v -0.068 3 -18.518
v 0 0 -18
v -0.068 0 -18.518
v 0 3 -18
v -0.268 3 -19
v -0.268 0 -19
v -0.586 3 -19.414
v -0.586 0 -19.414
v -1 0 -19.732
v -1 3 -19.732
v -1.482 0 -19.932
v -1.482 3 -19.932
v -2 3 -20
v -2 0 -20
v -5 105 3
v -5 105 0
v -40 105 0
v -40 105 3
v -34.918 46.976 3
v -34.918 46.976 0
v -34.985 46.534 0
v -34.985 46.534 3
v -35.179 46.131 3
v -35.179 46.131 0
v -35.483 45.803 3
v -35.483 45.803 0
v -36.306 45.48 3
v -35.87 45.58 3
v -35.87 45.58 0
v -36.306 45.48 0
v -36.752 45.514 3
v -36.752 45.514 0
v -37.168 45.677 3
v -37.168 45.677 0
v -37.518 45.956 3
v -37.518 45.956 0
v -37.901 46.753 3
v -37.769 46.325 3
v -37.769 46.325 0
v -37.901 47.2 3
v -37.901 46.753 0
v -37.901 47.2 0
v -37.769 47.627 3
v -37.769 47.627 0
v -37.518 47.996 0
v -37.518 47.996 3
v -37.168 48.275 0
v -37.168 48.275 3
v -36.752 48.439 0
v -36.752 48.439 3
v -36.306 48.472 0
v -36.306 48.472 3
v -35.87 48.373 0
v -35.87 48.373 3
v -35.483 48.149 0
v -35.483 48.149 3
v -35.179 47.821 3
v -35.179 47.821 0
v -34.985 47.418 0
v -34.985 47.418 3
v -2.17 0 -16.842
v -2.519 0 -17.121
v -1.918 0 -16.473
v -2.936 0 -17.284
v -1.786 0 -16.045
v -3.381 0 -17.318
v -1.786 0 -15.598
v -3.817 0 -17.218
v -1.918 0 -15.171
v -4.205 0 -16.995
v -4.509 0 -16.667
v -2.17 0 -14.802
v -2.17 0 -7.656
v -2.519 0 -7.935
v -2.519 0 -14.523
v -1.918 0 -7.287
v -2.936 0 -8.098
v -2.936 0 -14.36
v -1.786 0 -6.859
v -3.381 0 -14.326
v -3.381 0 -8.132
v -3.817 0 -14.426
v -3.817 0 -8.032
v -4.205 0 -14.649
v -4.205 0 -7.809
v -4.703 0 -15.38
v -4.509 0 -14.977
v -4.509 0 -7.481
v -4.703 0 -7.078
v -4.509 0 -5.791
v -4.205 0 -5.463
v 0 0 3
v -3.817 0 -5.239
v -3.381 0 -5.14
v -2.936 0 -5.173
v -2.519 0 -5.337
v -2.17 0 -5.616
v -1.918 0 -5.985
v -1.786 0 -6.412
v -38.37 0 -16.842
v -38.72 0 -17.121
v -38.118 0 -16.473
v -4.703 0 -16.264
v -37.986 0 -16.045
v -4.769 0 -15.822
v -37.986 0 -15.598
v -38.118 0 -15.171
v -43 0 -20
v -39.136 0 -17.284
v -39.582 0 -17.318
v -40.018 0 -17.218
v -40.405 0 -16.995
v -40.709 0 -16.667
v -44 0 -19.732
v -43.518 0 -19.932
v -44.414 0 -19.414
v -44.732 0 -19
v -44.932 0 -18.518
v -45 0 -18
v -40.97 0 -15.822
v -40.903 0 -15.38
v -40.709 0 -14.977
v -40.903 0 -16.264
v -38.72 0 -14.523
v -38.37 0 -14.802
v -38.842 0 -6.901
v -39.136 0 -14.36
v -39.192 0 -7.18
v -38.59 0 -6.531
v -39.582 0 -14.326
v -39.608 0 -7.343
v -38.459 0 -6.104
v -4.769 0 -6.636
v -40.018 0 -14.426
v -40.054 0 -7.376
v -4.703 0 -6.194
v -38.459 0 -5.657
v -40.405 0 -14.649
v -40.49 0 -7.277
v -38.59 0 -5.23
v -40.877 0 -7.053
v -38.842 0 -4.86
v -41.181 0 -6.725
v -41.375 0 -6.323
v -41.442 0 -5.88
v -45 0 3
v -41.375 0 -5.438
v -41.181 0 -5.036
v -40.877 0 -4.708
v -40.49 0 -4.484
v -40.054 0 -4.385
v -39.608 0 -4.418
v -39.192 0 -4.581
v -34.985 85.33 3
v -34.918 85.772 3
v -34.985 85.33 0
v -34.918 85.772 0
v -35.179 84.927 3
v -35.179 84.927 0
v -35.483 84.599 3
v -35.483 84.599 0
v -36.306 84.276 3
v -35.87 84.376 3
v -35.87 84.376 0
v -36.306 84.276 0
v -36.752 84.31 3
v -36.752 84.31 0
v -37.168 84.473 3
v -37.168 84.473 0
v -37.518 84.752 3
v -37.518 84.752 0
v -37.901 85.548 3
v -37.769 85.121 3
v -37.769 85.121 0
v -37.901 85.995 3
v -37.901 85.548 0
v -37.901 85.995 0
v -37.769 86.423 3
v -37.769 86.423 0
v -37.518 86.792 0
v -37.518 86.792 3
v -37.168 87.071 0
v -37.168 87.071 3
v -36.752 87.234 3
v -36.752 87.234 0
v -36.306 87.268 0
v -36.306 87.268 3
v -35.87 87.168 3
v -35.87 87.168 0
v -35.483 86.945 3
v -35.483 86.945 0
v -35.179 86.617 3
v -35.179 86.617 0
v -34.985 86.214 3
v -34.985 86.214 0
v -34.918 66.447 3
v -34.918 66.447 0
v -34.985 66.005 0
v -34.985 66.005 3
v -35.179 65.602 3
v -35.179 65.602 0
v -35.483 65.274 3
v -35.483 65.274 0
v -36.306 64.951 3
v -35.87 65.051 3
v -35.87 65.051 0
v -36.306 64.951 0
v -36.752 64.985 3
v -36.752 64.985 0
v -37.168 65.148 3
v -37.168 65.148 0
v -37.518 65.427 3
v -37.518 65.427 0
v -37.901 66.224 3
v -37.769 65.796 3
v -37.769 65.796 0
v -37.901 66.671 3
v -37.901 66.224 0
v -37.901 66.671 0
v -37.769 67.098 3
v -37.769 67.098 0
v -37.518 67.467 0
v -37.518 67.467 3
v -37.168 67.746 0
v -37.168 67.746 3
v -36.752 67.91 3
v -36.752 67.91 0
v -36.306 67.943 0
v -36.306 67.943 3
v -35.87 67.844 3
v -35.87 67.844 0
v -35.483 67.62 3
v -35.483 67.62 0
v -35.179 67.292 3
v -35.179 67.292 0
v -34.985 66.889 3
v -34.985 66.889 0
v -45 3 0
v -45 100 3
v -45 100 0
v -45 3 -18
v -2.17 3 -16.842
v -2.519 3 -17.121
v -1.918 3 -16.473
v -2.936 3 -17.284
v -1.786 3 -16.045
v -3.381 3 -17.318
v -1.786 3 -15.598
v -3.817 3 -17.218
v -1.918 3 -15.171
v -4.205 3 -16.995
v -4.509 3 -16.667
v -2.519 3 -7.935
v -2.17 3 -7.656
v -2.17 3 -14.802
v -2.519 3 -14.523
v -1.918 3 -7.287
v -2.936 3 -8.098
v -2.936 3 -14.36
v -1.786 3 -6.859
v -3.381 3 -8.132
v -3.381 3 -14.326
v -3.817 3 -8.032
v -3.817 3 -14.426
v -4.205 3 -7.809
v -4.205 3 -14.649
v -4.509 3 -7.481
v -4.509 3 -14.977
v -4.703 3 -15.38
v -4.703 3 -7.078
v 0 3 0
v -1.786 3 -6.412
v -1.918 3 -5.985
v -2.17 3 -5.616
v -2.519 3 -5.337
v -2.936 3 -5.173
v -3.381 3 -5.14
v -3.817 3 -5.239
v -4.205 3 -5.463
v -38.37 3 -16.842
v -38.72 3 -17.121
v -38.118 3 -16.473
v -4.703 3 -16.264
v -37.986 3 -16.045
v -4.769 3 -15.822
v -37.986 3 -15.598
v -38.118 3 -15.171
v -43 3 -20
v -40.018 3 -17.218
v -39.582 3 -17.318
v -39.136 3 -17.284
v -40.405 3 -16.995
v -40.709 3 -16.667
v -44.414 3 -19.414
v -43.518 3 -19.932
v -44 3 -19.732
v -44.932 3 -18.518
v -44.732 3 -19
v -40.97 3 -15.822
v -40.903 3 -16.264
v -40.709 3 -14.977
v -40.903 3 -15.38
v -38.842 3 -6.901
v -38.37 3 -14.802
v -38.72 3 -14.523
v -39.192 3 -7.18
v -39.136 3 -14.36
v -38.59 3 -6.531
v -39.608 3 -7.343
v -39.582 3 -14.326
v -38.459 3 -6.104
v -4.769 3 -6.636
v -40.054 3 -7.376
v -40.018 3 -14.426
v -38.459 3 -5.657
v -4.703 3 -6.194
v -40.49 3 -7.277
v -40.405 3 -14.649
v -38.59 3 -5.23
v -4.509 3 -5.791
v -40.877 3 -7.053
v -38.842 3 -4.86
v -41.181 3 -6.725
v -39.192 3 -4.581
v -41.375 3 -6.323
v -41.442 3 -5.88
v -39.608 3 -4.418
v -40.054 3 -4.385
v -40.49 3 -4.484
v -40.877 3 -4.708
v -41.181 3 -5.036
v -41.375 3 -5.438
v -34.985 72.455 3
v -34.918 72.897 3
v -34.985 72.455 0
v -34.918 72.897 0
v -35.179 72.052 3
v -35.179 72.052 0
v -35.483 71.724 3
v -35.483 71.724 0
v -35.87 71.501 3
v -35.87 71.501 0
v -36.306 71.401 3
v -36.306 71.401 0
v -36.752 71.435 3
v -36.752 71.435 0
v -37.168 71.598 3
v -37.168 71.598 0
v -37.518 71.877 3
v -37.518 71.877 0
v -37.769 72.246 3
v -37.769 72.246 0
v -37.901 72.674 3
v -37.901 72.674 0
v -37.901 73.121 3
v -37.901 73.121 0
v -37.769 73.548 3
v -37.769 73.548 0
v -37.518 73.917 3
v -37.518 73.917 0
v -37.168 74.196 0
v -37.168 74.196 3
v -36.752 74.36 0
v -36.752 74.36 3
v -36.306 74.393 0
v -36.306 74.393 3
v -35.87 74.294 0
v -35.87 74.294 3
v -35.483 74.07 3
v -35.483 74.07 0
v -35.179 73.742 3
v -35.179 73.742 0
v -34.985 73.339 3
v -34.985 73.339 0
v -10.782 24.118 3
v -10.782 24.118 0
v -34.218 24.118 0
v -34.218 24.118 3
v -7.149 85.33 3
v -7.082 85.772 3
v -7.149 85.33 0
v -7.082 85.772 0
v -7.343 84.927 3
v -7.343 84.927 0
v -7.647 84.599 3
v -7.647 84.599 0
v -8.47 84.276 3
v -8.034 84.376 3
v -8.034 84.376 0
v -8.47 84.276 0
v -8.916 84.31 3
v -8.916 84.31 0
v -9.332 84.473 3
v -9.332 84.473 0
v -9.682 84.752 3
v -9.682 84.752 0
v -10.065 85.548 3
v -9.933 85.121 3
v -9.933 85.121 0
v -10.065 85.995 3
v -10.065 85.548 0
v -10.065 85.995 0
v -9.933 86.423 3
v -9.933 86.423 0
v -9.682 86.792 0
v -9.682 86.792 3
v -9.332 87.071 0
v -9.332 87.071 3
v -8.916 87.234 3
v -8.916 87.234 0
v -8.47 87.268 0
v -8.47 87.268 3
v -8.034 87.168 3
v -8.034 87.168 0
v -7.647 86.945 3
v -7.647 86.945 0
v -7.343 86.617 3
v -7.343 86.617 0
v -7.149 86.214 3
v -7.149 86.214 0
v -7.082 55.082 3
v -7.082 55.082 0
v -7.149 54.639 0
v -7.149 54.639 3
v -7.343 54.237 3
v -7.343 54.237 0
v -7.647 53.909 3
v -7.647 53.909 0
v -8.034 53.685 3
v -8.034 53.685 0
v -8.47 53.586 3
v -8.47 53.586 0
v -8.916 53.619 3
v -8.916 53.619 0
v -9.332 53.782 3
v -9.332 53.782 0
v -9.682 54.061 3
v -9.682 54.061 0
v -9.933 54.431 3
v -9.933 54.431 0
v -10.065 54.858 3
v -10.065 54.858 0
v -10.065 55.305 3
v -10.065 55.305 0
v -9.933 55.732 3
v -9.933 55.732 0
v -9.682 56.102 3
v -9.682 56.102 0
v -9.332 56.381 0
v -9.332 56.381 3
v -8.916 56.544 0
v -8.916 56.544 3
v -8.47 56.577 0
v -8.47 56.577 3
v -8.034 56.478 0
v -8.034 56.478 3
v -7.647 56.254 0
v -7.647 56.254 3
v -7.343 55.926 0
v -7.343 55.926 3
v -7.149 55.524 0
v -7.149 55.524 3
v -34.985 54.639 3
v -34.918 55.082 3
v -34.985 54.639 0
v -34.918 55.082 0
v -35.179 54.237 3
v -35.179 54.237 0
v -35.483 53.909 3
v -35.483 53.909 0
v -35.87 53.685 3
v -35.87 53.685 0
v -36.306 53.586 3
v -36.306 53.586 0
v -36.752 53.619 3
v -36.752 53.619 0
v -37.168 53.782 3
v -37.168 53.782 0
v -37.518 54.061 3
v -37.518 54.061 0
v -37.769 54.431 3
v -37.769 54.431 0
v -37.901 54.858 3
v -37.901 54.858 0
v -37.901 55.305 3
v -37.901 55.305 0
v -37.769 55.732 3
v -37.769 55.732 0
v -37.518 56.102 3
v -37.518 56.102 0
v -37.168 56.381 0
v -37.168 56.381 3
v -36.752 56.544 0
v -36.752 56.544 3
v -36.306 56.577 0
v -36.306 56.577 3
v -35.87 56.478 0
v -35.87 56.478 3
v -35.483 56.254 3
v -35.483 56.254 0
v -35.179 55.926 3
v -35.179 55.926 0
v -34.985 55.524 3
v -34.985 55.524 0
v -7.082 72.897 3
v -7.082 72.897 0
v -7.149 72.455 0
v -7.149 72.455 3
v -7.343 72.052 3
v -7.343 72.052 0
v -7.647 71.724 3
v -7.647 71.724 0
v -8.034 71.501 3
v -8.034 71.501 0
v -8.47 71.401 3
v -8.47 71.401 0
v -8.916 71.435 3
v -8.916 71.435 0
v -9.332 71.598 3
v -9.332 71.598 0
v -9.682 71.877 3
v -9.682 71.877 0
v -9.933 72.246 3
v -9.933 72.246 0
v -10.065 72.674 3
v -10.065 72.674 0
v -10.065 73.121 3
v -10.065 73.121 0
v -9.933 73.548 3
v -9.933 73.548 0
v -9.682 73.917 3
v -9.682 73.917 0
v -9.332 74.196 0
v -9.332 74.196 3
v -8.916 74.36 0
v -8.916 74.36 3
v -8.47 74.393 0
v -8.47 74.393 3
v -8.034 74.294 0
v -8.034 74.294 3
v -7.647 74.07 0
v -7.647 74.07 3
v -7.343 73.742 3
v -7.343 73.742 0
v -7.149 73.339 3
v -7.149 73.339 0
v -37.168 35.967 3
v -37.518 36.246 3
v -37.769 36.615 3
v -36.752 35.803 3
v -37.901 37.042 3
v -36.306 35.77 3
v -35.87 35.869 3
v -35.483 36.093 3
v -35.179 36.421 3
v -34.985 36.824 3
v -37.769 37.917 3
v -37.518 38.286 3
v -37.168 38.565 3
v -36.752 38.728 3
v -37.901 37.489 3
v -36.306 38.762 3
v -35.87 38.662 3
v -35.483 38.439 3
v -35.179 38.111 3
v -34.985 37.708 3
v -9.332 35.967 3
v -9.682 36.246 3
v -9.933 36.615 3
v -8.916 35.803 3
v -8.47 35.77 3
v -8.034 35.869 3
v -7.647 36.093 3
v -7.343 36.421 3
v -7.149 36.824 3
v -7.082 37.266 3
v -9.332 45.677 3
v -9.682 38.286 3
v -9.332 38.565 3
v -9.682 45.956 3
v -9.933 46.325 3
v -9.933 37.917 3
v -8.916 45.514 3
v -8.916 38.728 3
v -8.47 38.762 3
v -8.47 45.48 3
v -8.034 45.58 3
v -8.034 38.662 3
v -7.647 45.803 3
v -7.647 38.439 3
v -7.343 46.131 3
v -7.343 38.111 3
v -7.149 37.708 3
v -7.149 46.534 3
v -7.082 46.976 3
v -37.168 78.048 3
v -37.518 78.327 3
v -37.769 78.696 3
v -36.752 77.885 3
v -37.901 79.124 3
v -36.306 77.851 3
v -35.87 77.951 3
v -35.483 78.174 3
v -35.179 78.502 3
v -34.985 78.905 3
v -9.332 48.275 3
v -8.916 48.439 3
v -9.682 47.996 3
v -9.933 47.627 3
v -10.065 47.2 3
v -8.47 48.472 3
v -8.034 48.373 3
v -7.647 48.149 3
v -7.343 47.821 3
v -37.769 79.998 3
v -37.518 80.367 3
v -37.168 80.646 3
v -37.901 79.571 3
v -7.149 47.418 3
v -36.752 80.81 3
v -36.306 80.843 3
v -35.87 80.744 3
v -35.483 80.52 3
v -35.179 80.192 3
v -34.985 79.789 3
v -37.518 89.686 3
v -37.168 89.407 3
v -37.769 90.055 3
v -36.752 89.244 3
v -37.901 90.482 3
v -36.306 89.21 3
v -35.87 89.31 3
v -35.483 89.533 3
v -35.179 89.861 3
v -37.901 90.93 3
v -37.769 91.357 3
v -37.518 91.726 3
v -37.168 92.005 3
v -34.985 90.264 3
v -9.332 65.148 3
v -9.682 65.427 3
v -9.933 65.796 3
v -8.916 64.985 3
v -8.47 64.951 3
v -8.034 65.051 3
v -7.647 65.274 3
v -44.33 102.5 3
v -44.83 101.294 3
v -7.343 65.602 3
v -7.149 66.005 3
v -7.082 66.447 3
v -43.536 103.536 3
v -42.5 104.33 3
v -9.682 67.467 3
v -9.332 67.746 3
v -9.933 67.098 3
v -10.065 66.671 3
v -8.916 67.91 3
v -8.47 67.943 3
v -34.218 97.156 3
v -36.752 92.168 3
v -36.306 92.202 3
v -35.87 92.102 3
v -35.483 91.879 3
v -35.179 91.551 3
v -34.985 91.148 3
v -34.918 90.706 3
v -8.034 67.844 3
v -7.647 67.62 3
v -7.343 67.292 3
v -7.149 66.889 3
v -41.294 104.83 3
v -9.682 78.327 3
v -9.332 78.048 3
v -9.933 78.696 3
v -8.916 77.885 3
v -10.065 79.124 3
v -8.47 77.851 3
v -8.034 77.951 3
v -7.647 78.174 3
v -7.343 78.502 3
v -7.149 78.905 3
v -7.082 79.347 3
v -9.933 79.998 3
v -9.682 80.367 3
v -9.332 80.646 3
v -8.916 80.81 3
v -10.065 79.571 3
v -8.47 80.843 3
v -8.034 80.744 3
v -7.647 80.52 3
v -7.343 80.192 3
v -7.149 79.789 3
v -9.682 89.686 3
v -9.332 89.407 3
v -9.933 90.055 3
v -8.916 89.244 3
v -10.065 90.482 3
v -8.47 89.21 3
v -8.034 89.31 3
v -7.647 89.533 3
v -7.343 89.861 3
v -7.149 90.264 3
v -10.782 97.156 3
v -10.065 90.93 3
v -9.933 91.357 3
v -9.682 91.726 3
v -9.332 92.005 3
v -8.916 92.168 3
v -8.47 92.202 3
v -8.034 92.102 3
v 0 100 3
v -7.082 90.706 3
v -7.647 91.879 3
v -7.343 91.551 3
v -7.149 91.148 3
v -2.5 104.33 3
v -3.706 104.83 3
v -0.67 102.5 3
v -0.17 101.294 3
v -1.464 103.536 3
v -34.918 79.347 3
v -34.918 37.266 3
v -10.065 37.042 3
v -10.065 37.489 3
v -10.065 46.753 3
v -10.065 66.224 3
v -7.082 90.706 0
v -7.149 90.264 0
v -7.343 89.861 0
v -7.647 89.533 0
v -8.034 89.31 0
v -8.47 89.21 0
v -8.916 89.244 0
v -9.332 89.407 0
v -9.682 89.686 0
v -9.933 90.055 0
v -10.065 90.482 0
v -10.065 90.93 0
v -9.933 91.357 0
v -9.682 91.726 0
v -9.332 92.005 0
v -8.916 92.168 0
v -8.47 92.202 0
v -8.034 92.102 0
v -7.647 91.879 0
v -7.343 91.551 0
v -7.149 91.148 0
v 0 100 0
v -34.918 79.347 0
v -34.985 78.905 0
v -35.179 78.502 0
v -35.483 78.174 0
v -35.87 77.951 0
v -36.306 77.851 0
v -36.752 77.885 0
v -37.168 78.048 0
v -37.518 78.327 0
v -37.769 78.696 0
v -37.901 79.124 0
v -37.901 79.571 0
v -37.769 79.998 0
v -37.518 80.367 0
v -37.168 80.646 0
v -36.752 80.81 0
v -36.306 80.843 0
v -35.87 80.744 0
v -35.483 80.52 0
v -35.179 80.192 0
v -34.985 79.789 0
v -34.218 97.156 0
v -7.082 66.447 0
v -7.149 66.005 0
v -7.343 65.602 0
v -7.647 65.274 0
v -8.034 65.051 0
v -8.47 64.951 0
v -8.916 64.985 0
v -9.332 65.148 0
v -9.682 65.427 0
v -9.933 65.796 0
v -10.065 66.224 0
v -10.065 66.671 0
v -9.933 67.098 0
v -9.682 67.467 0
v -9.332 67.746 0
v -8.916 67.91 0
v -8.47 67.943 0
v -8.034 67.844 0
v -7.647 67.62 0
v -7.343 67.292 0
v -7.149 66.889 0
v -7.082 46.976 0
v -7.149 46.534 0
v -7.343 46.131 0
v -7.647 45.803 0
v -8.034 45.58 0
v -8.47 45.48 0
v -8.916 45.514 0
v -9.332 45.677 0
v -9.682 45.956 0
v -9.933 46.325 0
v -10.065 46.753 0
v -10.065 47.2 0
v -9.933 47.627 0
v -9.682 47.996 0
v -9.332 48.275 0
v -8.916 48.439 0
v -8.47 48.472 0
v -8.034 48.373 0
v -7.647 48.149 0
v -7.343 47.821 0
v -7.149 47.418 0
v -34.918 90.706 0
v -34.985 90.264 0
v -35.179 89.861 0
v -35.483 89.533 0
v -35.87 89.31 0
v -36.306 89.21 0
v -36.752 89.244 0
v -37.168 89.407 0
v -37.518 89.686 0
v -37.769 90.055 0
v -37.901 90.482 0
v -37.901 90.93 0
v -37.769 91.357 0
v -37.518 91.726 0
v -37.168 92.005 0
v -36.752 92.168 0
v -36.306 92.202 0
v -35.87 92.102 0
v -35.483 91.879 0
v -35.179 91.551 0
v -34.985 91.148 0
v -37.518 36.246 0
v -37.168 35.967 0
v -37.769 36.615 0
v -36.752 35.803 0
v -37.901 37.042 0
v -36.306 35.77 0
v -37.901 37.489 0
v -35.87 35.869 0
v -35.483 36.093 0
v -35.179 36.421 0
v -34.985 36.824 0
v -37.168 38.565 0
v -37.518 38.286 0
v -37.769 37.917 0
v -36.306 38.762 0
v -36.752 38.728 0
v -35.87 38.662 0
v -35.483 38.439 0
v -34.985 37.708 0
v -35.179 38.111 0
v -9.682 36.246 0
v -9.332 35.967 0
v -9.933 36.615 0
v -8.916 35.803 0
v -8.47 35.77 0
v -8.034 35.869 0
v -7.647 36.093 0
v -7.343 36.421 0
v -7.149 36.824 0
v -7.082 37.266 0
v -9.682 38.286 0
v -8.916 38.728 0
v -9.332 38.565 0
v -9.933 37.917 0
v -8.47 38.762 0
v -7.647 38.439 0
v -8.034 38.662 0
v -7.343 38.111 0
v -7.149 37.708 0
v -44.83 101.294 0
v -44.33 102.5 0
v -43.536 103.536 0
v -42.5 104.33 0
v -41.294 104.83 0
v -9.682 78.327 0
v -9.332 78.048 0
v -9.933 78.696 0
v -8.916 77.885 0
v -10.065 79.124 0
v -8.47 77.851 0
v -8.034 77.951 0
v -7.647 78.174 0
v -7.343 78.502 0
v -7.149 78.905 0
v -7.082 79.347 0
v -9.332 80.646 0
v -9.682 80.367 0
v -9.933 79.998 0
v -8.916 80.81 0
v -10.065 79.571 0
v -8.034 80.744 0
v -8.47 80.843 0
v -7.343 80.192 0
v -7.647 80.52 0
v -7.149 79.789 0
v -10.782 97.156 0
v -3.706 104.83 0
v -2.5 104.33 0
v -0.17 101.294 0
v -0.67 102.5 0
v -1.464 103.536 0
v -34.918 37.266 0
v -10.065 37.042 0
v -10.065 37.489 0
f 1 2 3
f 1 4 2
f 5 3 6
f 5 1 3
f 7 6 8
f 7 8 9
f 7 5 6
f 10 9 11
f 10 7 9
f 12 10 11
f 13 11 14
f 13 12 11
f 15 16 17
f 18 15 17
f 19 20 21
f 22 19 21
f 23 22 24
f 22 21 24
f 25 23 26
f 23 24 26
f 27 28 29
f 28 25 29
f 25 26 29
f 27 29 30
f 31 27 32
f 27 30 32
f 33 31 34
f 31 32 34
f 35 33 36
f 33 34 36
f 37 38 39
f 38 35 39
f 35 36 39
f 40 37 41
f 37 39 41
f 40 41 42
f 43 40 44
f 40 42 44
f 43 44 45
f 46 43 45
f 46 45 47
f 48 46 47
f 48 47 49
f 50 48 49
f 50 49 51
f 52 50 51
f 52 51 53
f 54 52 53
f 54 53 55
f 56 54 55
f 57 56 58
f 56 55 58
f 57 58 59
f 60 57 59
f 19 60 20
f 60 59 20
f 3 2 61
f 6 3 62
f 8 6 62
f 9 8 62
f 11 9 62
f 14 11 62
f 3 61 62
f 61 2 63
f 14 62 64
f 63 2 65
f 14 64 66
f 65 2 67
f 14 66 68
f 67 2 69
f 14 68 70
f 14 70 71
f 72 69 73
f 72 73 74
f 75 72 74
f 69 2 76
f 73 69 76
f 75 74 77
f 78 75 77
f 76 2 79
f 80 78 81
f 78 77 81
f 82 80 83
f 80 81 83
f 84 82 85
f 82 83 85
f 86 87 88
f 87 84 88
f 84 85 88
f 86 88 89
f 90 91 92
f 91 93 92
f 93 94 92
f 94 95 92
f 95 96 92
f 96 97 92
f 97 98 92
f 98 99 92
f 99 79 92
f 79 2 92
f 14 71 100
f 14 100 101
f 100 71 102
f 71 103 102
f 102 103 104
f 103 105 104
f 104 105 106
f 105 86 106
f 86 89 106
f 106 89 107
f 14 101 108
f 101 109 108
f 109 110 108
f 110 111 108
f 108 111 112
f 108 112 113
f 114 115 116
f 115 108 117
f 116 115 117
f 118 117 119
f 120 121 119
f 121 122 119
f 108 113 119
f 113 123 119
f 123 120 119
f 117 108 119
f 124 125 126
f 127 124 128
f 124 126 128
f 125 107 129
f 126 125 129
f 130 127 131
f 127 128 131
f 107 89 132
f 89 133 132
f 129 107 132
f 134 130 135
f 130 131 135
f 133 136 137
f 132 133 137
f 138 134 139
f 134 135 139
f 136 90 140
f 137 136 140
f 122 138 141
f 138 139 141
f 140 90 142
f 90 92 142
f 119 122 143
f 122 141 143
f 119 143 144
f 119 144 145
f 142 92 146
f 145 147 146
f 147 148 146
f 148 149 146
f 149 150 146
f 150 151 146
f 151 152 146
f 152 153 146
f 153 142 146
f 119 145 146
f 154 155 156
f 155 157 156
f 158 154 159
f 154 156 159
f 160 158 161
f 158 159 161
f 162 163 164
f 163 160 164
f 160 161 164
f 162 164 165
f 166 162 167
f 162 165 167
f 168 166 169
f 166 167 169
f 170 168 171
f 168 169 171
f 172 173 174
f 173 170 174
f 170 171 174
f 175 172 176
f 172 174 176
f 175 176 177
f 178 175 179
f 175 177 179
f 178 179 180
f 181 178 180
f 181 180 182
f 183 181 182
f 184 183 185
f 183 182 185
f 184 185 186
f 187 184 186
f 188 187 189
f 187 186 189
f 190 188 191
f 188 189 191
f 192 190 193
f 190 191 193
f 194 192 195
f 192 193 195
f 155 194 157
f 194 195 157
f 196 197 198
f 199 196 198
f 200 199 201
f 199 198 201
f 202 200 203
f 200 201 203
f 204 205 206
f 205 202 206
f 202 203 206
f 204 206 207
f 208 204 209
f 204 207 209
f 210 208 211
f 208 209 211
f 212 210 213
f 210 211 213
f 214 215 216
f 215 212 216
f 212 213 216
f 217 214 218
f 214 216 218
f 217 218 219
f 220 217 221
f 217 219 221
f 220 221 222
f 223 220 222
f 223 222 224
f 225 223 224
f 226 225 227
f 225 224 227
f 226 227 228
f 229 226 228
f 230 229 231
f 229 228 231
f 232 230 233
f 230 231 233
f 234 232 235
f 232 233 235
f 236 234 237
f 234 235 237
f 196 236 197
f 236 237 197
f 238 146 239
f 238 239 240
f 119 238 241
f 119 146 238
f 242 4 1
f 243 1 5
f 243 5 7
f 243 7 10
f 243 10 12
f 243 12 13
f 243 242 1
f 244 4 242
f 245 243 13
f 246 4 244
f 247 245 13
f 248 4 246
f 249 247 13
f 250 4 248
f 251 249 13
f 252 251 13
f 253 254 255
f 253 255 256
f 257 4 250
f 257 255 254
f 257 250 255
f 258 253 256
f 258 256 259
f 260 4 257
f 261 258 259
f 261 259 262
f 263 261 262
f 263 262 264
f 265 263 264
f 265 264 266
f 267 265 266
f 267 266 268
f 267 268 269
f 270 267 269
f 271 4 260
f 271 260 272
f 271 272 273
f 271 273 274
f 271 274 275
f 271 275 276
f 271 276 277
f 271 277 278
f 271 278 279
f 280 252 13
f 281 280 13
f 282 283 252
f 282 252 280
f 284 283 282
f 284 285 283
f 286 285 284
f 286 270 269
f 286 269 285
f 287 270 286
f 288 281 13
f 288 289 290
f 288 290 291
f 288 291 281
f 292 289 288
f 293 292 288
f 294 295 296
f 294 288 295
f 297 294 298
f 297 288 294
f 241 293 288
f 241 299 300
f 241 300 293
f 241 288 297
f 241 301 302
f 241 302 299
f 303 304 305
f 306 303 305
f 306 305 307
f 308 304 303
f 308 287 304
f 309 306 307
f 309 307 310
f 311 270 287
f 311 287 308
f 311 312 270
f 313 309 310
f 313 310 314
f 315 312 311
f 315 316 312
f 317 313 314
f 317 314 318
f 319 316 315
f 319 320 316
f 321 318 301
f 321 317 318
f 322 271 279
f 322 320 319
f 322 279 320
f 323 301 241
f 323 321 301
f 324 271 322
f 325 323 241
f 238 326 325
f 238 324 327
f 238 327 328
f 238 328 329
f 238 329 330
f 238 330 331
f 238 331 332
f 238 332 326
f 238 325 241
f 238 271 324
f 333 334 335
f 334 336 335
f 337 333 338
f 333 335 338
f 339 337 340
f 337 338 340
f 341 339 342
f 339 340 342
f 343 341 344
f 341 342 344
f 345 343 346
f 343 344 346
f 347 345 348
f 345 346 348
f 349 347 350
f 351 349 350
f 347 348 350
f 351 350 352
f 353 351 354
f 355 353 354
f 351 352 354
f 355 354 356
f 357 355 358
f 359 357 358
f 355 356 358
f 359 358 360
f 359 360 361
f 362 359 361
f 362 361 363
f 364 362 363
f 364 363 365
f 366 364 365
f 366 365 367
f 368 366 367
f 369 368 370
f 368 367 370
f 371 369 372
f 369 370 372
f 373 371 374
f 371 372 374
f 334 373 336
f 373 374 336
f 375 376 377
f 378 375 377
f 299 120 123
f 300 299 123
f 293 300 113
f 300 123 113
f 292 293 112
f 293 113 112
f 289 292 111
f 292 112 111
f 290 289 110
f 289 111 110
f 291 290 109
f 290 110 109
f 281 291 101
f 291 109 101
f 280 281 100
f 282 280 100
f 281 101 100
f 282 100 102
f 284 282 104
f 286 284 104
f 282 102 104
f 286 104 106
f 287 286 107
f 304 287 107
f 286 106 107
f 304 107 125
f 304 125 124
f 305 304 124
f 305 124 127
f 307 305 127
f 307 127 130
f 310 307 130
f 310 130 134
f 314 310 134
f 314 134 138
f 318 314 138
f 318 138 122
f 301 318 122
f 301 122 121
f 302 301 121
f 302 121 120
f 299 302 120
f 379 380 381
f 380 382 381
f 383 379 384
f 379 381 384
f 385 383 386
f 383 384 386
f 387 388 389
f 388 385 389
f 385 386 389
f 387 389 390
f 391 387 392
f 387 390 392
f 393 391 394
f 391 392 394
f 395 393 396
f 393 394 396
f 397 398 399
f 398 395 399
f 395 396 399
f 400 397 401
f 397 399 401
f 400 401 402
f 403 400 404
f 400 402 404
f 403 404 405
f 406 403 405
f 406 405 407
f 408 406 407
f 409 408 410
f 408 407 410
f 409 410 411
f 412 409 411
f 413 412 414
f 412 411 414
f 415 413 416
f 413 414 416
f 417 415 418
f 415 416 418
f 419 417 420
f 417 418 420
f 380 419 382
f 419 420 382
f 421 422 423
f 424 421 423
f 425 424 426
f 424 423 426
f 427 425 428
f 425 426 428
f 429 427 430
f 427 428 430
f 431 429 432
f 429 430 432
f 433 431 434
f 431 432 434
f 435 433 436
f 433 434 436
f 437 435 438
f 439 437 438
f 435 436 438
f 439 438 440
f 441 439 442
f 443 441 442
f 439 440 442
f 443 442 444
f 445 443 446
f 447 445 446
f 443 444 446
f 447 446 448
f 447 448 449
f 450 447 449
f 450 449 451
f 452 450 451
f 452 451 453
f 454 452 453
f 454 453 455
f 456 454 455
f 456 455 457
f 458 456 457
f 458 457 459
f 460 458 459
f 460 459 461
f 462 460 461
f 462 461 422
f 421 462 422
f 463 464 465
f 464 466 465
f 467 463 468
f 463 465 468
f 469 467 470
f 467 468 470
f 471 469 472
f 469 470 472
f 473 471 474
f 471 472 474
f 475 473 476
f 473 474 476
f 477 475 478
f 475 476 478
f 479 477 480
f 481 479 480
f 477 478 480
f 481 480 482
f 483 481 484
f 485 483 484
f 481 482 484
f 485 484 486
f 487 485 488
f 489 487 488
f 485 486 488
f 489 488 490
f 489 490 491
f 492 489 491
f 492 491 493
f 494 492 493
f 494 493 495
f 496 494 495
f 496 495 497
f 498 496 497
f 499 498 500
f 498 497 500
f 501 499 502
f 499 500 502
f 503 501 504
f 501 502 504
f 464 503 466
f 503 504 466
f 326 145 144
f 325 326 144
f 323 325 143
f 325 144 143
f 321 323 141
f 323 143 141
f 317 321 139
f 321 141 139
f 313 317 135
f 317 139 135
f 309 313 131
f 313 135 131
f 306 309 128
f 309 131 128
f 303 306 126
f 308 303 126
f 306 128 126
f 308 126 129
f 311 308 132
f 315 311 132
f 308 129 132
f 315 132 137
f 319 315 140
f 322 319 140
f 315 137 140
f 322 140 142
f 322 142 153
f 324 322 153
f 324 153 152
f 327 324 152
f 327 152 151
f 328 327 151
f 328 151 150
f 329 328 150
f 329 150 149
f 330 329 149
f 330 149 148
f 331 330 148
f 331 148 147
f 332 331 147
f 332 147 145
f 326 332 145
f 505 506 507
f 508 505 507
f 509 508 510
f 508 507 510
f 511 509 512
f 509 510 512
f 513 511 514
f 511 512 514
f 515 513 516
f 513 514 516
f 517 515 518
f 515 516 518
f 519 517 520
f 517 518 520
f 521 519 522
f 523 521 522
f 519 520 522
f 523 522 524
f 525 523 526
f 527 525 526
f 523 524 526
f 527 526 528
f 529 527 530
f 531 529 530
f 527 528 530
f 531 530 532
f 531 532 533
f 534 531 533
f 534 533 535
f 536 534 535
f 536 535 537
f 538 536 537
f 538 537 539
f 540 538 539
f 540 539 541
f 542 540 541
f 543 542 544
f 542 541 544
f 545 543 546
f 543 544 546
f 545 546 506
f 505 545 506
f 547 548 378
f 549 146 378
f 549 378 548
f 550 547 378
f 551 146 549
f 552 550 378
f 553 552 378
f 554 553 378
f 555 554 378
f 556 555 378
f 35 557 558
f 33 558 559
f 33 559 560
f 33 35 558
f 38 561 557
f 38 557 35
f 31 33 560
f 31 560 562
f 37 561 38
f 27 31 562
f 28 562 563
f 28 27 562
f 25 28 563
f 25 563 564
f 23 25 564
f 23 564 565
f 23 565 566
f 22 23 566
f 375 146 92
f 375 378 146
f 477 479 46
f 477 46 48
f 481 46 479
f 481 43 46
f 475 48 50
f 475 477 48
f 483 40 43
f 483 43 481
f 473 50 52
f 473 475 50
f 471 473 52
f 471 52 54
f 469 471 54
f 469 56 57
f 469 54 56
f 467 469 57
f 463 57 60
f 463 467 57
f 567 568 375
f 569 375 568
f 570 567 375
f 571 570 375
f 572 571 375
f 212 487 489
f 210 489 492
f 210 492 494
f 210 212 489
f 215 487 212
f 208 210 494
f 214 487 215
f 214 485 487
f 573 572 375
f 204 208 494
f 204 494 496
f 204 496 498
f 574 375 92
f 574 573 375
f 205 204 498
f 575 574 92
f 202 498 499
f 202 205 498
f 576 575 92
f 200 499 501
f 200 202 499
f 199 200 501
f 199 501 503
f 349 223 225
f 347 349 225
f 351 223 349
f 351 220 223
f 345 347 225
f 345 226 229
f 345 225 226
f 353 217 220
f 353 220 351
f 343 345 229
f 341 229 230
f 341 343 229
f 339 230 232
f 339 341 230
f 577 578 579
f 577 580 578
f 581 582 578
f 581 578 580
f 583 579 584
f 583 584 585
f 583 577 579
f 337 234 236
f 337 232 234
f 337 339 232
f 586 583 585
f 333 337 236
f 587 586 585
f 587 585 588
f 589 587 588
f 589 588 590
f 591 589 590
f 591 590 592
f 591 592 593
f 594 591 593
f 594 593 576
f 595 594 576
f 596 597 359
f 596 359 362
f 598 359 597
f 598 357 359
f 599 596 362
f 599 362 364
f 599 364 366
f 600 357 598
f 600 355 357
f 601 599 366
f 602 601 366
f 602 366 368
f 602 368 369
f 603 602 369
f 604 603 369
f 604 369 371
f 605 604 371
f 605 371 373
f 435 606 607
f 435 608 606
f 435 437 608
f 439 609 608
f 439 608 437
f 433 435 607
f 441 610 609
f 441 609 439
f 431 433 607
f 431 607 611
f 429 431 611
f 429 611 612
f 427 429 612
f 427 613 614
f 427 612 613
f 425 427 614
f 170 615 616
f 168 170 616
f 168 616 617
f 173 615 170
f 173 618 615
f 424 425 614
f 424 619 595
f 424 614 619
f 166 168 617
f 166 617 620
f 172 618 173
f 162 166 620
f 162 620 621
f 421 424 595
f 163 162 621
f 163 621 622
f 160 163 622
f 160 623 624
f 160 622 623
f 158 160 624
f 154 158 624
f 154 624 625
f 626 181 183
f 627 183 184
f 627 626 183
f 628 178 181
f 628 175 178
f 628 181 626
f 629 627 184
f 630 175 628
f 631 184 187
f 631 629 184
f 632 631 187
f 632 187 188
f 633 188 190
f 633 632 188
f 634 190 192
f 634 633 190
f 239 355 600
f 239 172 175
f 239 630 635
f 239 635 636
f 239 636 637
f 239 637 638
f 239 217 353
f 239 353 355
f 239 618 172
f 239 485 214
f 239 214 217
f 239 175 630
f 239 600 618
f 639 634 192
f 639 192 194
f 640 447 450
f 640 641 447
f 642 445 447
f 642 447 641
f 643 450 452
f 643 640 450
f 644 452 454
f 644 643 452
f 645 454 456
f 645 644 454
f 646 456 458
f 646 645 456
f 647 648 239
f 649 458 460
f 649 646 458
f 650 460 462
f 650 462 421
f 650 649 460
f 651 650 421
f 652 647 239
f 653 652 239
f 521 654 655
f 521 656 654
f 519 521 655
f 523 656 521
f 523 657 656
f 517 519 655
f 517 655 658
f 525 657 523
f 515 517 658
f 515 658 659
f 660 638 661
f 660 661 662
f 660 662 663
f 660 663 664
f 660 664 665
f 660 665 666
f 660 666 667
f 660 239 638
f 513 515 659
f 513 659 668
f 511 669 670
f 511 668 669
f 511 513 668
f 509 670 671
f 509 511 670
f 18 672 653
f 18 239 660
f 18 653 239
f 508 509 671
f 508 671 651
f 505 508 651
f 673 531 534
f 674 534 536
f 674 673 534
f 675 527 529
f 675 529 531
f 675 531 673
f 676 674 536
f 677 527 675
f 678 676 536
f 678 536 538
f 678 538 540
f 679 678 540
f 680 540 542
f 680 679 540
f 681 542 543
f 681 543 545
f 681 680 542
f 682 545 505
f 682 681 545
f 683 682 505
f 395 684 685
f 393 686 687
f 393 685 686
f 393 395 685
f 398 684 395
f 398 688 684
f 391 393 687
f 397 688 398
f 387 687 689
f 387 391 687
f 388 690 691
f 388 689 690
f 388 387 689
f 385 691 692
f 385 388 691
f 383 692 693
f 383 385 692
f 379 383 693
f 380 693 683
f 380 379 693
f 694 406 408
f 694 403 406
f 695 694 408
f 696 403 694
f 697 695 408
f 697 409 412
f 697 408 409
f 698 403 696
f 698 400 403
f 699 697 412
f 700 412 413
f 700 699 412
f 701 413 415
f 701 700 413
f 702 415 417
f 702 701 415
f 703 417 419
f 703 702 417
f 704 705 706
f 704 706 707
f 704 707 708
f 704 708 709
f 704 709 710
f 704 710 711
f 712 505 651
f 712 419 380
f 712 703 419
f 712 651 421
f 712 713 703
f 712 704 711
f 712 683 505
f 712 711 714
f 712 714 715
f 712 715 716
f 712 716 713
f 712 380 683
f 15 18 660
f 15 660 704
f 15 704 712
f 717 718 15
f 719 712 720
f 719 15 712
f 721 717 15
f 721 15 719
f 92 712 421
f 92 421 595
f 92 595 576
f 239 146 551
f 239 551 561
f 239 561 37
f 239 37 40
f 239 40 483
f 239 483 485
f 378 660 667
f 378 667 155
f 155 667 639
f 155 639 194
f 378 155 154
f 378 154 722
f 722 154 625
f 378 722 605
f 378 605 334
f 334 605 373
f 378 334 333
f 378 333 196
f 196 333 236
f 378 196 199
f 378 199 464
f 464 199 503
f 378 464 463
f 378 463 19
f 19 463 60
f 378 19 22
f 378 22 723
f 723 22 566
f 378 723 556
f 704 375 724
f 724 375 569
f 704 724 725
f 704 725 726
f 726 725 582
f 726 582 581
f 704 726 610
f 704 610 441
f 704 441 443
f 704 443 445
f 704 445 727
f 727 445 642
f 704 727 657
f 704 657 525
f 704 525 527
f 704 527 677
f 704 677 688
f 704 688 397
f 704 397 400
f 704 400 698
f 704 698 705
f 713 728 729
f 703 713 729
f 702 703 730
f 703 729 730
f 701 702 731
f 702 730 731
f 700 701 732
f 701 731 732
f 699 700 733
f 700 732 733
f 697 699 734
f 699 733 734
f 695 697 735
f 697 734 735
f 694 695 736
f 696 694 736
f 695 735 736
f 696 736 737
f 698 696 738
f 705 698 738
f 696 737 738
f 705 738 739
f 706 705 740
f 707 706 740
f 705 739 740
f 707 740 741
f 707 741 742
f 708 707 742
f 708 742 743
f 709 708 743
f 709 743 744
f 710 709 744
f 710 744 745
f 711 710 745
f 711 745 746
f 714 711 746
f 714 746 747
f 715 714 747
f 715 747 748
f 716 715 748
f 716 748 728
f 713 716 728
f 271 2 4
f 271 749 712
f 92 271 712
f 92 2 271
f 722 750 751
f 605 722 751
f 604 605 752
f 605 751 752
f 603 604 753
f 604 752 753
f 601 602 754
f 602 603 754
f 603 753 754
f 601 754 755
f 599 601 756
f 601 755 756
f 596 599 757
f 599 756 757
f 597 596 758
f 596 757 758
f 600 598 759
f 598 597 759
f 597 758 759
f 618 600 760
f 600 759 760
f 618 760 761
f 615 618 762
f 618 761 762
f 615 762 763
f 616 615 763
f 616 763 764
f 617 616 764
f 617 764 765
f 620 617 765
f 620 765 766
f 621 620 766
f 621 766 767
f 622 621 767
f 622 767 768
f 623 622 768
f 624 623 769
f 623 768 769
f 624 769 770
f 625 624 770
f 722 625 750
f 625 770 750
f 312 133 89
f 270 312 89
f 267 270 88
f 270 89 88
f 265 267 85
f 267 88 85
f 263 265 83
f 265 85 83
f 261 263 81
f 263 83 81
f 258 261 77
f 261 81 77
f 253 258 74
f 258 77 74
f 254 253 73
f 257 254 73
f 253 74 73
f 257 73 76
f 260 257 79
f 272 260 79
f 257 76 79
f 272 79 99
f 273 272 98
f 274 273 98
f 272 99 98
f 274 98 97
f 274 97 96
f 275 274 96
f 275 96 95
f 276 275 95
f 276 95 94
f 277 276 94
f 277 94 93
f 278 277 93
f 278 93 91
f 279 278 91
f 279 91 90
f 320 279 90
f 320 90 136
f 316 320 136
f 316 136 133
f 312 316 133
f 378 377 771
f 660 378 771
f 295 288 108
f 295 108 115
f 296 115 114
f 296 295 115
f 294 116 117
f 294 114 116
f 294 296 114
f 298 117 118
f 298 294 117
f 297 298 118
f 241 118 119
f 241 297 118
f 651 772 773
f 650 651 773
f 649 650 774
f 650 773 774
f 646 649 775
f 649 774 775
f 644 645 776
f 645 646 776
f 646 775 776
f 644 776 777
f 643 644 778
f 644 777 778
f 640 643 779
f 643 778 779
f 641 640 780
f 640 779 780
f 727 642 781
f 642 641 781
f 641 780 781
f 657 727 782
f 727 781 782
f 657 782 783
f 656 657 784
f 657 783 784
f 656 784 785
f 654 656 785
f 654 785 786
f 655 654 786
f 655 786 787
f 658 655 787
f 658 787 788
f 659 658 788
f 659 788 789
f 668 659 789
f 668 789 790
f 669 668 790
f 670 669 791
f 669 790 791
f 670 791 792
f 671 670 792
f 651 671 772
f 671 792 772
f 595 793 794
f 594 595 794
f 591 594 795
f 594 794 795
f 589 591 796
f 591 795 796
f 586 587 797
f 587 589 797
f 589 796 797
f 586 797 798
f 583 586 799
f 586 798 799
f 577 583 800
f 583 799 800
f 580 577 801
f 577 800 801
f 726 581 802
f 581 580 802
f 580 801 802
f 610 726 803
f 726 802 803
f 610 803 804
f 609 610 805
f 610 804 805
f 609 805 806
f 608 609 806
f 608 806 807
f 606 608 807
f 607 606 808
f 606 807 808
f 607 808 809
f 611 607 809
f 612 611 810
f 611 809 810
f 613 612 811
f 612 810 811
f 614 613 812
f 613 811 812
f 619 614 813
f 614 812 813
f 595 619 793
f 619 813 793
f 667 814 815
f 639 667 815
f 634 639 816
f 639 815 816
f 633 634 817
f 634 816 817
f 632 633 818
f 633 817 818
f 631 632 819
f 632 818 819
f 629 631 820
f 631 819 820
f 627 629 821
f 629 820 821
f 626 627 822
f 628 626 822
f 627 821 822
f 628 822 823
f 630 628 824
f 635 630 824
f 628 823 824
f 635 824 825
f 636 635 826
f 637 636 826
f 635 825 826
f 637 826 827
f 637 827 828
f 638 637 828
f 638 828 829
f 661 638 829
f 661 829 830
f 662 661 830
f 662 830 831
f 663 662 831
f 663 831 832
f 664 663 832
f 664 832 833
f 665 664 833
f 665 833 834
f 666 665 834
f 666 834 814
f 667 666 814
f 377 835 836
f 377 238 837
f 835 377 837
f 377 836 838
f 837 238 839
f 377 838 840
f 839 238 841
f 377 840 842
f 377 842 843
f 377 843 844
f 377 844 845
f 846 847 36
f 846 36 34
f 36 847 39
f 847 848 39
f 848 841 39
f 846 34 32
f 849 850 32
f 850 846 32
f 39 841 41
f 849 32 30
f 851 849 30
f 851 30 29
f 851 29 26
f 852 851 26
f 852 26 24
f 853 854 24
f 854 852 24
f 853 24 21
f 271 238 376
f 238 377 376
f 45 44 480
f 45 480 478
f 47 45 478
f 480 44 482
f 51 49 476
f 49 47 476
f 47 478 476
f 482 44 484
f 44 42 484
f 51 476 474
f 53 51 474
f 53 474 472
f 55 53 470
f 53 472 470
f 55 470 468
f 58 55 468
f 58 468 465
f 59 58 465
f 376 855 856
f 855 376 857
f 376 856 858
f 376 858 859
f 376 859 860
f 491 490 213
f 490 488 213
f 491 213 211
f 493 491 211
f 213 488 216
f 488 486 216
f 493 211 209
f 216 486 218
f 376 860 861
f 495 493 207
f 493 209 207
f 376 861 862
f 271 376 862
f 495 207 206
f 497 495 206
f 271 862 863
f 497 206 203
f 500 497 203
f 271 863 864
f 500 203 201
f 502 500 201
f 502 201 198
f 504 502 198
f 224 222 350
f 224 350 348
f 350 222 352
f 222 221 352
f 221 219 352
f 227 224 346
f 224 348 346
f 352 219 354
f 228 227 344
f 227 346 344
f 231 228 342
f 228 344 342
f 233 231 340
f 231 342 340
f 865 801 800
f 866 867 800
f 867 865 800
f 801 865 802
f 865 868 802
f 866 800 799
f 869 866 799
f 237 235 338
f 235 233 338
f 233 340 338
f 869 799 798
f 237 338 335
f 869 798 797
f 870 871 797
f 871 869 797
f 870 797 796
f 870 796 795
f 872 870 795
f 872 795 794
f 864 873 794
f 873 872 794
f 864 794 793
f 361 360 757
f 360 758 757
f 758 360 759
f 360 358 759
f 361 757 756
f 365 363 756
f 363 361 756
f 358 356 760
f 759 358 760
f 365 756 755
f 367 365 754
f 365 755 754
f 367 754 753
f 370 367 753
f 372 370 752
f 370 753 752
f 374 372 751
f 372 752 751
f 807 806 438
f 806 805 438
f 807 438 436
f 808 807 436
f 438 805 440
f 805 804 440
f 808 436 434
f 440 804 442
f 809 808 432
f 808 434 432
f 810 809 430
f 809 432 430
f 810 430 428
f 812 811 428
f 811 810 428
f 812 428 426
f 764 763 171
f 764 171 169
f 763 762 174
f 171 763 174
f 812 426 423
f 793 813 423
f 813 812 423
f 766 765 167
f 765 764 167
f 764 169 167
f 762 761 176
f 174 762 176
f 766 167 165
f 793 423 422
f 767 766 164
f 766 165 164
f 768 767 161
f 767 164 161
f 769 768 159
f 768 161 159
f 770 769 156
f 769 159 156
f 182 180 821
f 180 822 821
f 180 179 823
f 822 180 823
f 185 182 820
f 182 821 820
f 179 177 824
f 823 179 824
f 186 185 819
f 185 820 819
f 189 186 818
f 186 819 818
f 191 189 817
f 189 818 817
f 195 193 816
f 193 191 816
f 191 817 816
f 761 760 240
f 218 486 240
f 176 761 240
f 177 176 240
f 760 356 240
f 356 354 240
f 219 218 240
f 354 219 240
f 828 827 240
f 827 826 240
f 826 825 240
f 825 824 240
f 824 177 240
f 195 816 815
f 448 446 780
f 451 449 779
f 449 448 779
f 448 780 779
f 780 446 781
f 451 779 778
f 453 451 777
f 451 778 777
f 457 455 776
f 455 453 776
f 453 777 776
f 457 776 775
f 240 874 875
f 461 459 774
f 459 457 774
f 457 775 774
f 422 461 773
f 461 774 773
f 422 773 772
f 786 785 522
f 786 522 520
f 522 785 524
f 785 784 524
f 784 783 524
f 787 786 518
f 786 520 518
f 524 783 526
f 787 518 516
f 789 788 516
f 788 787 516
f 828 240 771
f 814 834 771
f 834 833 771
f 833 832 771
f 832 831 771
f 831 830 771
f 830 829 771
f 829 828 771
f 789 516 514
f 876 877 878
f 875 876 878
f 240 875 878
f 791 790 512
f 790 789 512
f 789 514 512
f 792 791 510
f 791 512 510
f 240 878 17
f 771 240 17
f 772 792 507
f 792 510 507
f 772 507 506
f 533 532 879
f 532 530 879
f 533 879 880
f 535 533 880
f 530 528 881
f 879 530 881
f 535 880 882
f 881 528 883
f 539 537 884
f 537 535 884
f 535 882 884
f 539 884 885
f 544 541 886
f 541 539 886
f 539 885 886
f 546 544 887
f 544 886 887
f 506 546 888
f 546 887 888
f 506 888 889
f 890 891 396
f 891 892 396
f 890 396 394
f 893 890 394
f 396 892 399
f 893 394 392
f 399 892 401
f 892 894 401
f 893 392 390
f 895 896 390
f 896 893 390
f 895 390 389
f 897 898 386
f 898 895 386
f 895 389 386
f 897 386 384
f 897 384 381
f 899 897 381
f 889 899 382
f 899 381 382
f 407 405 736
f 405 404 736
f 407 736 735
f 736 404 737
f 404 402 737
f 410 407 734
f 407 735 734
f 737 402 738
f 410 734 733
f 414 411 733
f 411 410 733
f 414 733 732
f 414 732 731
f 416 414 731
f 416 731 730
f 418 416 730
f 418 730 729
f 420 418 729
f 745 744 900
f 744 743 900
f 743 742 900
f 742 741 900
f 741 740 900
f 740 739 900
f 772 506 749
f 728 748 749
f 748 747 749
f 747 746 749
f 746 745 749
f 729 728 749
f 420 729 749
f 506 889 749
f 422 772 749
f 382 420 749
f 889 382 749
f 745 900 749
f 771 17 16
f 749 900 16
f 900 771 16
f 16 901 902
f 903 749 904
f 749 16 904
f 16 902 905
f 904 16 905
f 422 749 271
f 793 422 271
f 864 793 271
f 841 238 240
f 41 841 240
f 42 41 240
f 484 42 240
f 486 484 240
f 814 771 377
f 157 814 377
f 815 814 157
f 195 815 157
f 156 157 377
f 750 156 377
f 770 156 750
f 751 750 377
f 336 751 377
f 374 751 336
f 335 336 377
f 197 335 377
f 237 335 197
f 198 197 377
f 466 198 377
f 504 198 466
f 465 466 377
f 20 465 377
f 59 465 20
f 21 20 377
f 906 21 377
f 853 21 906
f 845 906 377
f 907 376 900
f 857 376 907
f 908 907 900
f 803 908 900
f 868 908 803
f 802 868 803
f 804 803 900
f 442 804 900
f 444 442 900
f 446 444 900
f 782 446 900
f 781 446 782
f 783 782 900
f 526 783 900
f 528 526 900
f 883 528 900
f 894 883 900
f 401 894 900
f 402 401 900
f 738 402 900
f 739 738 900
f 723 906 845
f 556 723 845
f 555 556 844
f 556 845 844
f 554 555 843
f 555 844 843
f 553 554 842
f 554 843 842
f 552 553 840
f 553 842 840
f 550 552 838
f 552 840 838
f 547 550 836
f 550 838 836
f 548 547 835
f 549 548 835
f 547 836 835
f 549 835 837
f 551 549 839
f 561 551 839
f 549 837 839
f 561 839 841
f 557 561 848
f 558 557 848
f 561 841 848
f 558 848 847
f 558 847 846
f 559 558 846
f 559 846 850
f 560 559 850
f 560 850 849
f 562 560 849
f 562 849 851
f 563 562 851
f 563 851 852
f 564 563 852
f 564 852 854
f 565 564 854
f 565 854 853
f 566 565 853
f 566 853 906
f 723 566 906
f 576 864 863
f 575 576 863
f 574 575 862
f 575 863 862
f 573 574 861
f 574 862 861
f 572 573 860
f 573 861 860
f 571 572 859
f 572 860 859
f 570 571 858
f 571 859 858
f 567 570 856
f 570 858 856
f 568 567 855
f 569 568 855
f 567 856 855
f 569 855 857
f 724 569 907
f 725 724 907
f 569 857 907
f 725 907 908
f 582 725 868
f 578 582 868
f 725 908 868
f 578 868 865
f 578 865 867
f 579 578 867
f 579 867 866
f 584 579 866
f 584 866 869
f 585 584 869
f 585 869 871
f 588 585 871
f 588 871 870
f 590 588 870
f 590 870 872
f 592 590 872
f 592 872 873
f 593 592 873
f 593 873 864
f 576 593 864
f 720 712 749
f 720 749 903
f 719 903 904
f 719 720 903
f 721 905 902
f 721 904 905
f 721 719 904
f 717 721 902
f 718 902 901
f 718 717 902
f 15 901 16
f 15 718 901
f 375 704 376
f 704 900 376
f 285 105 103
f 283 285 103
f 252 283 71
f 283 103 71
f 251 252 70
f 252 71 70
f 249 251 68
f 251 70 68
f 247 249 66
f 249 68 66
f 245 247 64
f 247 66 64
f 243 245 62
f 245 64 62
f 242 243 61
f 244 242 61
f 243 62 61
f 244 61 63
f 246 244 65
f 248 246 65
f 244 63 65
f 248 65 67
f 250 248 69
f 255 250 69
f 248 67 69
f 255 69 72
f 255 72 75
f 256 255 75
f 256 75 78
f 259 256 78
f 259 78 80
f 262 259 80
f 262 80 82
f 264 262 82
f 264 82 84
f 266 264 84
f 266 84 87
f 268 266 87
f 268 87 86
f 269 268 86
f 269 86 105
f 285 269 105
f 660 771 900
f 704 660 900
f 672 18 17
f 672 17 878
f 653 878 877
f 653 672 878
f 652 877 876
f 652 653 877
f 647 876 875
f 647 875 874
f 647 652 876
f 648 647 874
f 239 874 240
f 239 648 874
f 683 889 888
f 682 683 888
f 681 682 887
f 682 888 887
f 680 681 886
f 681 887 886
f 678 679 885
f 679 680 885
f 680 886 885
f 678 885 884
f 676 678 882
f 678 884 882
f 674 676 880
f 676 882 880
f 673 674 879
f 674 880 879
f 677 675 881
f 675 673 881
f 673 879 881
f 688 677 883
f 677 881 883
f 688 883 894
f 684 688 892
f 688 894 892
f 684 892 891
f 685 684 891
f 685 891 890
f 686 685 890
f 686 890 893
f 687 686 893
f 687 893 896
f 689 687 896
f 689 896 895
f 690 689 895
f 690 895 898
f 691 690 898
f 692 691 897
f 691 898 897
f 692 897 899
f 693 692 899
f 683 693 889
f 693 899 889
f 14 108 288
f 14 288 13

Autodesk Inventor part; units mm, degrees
ref_plane "YZ Plane" through (0, 0, 0) normal (1, 0, 0) x (0, 1, 0)
ref_plane "XZ Plane" through (0, 0, 0) normal (0, 1, 0) x (-1, 0, 0)
ref_plane "XY Plane" through (0, 0, 0) normal (0, 0, 1) x (1, 0, 0)
sketch "Sketch1" plane through (0, 0, 0) normal (0, 1, 0) x (-1, 0, 0)
  line L0 (0, 0) -> (45, 0)
  line L1 (45, 0) -> (45, -20)
  line L2 (45, -20) -> (0, -20)
  line L3 (0, -20) -> (0, 0)
  circle A0 centre (39.9418, -5.8805) radius 1.5
  circle A1 centre (39.4697, -15.8219) radius 1.5
  circle A2 centre (3.2694, -6.6358) radius 1.5
  circle A3 centre (3.2694, -15.8219) radius 1.5
  dimension "d0" = 45
  dimension "d1" = 20
  dimension "d4" = 3
  dimension "d5" = 3
  dimension "d6" = 3
  dimension "d7" = 3
extrude "Extrusion1" add sketch "Sketch1" along normal blind 3 contours L0 L1 L2 L3 | A0 | A1 | A2 | A3
extrude "Extrusion2" cut sketch "Sketch1" along normal through all contours A0 | A1 | A2 | A3
sketch "Sketch2" plane through (-45, 0, 0) normal (0, 0, 1) x (1, 0, 0)
  line L0 (0, 0) -> (45, 0)
  line L1 (45, 0) -> (45, 105)
  line L2 (45, 105) -> (0, 105)
  line L3 (0, 105) -> (0, 0)
  line L4 (10.782, 97.156) -> (34.218, 97.156)
  line L5 (34.218, 97.156) -> (34.218, 84.256)
  line L6 (34.218, 84.256) -> (10.782, 84.256)
  line L7 (10.782, 84.256) -> (10.782, 97.156)
  circle A0 centre (8.582, 90.706) radius 1.5
  circle A1 centre (36.418, 90.706) radius 1.5
  line L8 (10.782, 79.3472) -> (34.218, 79.3472)
  line L9 (34.218, 79.3472) -> (34.218, 66.4472)
  line L10 (34.218, 66.4472) -> (10.782, 66.4472)
  line L11 (10.782, 66.4472) -> (10.782, 79.3472)
  circle A2 centre (8.582, 72.8972) radius 1.5
  circle A3 centre (36.418, 72.8972) radius 1.5
  line L12 (10.782, 61.5315) -> (34.218, 61.5315)
  line L13 (34.218, 61.5315) -> (34.218, 48.6315)
  line L14 (34.218, 48.6315) -> (10.782, 48.6315)
  line L15 (10.782, 48.6315) -> (10.782, 61.5315)
  circle A4 centre (8.582, 55.0815) radius 1.5
  circle A5 centre (36.418, 55.0815) radius 1.5
  circle A6 centre (36.418, 37.2658) radius 1.5
  circle A7 centre (8.582, 37.2658) radius 1.5
  line L16 (10.782, 30.8158) -> (10.782, 43.7158)
  line L17 (34.218, 30.8158) -> (10.782, 30.8158)
  line L18 (34.218, 43.7158) -> (34.218, 30.8158)
  line L19 (10.782, 43.7158) -> (34.218, 43.7158)
  line L20 (10.782, 97.156) -> (34.218, 97.156)
  line L21 (34.218, 97.156) -> (34.218, 24.1177)
  line L22 (34.218, 24.1177) -> (10.782, 24.1177)
  line L23 (10.782, 24.1177) -> (10.782, 97.156)
  circle A8 centre (8.582, 85.7719) radius 1.5
  circle A9 centre (36.418, 85.7719) radius 1.5
  circle A10 centre (8.582, 79.3472) radius 1.5
  circle A11 centre (36.418, 79.3472) radius 1.5
  circle A12 centre (8.582, 66.4472) radius 1.5
  circle A13 centre (36.418, 66.4472) radius 1.5
  circle A14 centre (36.418, 46.9762) radius 1.5
  circle A15 centre (8.582, 46.9762) radius 1.5
  point P0 (10.782, 90.706)
  point P1 (10.782, 72.8972)
  point P2 (10.782, 55.0815)
  point P3 (10.782, 37.2658)
  dimension "d10" = 105
  dimension "d13" = 45
  dimension "d14" = 23.436
  dimension "d15" = 12.9
  dimension "d17" = 10.782
  dimension "d18" = 3
  dimension "d19" = 3
  dimension "d20" = 2.2
  dimension "d21" = 2.2
  dimension "d22" = 23.436
  dimension "d23" = 12.9
  dimension "d24" = 3
  dimension "d25" = 3
  dimension "d26" = 2.2
  dimension "d27" = 2.2
  dimension "d28" = 23.436
  dimension "d29" = 12.9
  dimension "d30" = 3
  dimension "d31" = 3
  dimension "d32" = 2.2
  dimension "d33" = 2.2
  dimension "d34" = 23.436
  dimension "d35" = 12.9
  dimension "d36" = 3
  dimension "d37" = 3
  dimension "d38" = 2.2
  dimension "d39" = 2.2
  dimension "d44" = 3
  dimension "d45" = 3
  dimension "d46" = 3
  dimension "d47" = 3
  dimension "d48" = 3
  dimension "d49" = 3
  dimension "d50" = 3
  dimension "d51" = 3
extrude "Extrusion3" add sketch "Sketch2" along normal blind 3 contours L3 L2 L1 L0 | L4 L5 L6 L7 | L6 L21 L8 L23 | L8 L9 L10 L11 | L10 L21 L12 L23 | L12 L13 L14 L15 | L14 L21 L19 L23 | L19 L18 L17 L16 | L17 L21 L22 L23 | A0 | A1 | A2 | A3 | A4 | A5 | A6 | A7 | A8 | A9 | A10 | A11 | A12 | A13 | A14 | A15
extrude "Extrusion4" cut sketch "Sketch2" along normal through all contours L4 L5 L6 L7 | L8 L9 L10 L11 | L12 L13 L14 L15 | L19 L18 L17 L16 | A0 | A1 | A2 | A3 | A4 | A5 | A6 | A7
extrude "Extrusion5" cut sketch "Sketch2" along normal through all contours L6 L21 L8 L23 | L10 L21 L12 L23 | L14 L21 L19 L23 | L17 L21 L22 L23
extrude "Extrusion6" cut sketch "Sketch2" along normal blind 3 contours A8 | A9 | A10 | A11 | A12 | A13 | A14 | A15
fillet "Fillet1" radius 5 1 edges at (-45, 105, 1.5)
fillet "Fillet2" radius 5 1 edges at (0, 105, 1.5)
fillet "Fillet3" radius 2 2 edges at (0, 1.5, -20) (-45, 1.5, -20)
sketch "Sketch4" plane through (-45, 0, 3) normal (0, 0, 1) x (1, 0, 0)
  point P0 (45, 0)
equation "\"d52\" = d48"
properties part number "servo atach"
